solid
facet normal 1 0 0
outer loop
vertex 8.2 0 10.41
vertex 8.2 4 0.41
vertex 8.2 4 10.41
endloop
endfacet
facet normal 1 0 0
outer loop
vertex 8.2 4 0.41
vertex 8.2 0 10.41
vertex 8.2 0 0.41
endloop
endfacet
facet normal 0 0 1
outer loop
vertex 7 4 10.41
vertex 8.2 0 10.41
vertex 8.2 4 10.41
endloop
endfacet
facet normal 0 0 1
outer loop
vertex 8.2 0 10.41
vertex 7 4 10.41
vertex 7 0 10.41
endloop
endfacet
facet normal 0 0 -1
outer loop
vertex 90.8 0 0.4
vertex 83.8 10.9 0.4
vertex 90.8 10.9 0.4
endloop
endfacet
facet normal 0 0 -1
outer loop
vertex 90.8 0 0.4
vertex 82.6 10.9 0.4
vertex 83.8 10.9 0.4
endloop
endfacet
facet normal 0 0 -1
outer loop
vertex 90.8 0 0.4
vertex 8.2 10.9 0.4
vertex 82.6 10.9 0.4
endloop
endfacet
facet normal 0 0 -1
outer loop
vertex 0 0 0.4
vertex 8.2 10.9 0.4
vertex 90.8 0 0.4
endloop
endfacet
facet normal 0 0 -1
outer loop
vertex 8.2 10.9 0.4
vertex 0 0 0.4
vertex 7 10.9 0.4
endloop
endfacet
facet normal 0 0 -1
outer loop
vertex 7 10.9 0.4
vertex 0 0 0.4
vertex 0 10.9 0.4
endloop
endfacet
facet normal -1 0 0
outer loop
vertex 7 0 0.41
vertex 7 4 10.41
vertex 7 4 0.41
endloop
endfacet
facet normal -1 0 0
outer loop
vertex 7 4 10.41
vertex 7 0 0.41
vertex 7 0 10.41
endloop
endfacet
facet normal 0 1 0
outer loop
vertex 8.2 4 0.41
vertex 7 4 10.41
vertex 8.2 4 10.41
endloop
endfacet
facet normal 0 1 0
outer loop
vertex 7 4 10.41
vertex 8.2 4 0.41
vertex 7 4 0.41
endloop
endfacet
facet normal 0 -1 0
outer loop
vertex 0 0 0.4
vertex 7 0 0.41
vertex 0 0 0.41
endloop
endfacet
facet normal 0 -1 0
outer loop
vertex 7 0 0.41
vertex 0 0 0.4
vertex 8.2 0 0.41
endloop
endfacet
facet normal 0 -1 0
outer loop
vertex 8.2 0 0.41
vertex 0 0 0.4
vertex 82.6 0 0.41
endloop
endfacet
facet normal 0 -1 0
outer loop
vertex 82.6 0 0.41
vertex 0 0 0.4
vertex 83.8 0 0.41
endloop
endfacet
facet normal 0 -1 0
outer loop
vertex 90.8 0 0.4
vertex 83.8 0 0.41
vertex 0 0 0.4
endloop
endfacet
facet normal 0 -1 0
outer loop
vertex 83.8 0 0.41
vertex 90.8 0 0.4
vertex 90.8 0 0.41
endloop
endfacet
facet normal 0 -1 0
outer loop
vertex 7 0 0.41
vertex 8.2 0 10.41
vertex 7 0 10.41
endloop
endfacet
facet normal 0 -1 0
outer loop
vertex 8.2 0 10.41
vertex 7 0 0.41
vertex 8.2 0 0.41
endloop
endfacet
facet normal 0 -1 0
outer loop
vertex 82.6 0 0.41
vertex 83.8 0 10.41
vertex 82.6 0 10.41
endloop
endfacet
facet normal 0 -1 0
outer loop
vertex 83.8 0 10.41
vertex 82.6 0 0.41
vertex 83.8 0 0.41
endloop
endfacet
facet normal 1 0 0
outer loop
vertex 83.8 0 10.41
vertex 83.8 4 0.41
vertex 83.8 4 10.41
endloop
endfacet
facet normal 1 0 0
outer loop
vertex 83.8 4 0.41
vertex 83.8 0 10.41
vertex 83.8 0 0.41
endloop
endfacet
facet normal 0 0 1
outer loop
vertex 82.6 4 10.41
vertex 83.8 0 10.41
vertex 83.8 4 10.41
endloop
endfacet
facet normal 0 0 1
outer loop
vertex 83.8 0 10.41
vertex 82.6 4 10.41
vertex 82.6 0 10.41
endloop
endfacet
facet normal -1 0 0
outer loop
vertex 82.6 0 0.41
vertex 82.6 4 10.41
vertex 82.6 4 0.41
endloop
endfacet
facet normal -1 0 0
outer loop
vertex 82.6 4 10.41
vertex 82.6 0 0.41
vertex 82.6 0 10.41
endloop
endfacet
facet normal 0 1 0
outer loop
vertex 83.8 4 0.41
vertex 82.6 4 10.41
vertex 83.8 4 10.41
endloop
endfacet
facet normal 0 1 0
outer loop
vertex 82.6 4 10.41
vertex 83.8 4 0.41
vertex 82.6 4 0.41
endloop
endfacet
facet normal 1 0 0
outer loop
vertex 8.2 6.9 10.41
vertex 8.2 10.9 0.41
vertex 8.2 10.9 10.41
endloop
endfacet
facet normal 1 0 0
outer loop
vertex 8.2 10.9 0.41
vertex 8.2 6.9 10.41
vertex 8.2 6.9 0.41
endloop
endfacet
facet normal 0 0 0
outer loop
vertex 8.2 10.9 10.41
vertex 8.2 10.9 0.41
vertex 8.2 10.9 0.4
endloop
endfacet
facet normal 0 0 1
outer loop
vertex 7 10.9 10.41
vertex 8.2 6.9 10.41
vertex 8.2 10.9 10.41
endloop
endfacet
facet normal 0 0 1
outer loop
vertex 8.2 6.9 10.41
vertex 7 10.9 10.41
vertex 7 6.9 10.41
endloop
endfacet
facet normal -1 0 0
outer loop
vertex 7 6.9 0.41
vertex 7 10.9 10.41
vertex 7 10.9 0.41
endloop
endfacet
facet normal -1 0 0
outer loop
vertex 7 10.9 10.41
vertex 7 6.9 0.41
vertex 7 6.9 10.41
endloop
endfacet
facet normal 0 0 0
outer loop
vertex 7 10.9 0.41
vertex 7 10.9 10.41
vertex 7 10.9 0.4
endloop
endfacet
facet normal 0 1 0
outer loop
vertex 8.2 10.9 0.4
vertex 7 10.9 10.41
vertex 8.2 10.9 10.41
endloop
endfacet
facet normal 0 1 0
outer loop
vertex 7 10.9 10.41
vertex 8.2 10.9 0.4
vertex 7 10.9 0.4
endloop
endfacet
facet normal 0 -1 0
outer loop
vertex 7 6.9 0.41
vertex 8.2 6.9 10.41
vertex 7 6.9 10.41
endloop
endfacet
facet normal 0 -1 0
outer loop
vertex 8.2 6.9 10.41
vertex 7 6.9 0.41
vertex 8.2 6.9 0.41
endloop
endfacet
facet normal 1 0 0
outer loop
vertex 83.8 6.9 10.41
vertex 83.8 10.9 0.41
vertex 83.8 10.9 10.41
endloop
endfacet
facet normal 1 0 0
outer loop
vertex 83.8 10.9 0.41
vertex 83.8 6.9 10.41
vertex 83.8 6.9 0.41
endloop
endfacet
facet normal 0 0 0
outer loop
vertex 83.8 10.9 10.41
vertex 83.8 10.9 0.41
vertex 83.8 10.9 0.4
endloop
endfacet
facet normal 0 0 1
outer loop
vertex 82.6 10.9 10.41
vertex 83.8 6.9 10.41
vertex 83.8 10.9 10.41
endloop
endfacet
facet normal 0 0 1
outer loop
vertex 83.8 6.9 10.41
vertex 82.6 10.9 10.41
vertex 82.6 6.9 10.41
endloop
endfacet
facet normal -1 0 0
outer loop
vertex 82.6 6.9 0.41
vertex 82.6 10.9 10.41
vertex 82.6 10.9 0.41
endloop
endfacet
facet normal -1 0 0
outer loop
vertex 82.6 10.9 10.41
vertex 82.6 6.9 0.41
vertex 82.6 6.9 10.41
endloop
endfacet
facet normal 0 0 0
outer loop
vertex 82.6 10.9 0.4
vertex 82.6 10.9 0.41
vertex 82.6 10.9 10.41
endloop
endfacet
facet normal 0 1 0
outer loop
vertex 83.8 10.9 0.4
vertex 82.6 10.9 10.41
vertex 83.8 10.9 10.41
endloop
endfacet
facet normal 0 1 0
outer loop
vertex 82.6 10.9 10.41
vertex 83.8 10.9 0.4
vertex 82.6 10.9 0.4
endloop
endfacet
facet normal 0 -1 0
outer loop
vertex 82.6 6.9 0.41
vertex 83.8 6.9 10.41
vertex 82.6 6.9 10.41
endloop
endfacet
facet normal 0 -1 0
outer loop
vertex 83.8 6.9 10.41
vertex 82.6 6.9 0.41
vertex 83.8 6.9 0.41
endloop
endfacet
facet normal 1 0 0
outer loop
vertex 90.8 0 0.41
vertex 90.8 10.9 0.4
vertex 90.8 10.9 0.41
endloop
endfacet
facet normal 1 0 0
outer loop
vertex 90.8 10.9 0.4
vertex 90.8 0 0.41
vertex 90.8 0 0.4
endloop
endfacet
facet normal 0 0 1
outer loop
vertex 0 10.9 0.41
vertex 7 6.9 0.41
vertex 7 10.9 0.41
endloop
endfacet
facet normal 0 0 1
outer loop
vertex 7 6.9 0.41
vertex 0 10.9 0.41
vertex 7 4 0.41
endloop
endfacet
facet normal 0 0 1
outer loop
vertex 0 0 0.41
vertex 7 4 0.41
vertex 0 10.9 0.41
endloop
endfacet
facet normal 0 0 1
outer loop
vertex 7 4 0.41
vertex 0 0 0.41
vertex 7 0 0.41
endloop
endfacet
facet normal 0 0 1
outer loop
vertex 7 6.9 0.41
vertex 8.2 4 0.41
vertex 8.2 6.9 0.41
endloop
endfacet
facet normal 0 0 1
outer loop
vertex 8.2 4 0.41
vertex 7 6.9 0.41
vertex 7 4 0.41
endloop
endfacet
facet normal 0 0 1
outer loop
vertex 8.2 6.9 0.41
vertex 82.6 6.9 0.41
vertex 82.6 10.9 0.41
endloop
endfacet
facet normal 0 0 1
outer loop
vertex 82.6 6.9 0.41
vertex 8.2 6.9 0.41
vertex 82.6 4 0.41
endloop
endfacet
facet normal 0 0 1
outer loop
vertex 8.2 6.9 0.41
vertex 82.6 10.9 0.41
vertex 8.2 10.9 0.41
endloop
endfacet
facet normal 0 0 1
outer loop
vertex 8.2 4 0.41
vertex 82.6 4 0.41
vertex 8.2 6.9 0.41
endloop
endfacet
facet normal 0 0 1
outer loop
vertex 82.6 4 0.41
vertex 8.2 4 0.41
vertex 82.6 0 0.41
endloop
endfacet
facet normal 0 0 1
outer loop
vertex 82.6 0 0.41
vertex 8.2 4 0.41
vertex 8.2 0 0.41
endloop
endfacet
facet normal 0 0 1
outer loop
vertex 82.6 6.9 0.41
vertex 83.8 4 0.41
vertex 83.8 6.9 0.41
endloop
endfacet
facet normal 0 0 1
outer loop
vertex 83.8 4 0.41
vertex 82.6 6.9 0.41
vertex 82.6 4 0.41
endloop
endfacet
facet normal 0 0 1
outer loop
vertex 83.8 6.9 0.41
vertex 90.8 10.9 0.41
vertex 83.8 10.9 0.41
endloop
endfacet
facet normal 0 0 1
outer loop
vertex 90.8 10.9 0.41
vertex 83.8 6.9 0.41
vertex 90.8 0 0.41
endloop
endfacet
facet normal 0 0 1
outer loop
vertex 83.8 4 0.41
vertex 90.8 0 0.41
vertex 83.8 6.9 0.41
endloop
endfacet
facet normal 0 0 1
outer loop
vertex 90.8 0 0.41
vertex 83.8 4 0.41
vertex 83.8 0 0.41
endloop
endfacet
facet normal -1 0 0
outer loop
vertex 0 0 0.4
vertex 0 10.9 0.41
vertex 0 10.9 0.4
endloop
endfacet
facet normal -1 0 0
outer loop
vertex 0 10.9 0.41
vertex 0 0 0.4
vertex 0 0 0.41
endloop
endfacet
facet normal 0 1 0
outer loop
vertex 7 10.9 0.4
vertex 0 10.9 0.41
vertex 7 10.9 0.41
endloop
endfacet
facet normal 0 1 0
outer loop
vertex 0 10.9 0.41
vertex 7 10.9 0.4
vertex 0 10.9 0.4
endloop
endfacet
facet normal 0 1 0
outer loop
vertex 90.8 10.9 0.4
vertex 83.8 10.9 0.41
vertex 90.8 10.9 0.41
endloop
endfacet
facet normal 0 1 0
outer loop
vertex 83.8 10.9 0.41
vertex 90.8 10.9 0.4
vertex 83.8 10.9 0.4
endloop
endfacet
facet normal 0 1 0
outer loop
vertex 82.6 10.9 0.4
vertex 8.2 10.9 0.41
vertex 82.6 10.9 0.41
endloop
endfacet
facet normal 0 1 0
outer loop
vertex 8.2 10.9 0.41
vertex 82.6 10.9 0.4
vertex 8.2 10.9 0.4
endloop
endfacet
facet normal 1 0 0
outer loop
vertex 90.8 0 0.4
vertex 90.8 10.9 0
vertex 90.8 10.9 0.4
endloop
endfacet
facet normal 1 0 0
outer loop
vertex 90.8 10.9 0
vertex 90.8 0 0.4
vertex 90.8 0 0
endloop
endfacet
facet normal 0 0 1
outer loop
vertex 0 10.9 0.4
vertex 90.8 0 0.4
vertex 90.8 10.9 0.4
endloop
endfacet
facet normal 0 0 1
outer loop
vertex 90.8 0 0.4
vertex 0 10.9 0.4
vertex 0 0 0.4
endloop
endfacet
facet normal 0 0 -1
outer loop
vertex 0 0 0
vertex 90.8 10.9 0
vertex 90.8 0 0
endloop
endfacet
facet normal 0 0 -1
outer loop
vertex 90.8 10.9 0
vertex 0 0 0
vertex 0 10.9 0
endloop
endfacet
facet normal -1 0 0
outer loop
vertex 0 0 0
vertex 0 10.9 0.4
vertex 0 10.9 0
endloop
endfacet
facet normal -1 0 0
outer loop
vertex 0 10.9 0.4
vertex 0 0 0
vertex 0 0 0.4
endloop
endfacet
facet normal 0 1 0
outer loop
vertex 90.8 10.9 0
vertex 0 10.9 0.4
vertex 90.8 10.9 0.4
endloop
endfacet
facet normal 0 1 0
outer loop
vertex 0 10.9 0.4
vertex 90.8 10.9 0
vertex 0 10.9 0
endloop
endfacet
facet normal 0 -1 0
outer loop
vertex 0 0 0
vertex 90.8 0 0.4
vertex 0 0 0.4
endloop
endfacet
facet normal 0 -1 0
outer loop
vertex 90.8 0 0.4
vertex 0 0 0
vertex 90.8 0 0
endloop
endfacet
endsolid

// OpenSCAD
// file: ../../Base/Rotation.scad
// Fischertechnik Box Foundation
// Geometry Helpers Rotation

include <PlacementOptions.scad>

// getRotatedSpace(space, rotation=NoRotation)
// Rotates the space dependent on the specified rotation

function getRotatedSpace(space, rotation=NoRotation) = [
    (rotation == Rotate90 || rotation == Rotate270) ? space.y : space.x,
    (rotation == Rotate90 || rotation == Rotate270) ? space.x : space.y
];

// Rotates the given space around the fixed left lower corner
// space = the space the children needs as width/depth list [width,depth]
// rotation = 0 Rotate0 degrees, 1 Rotate90 degrees, 2 Rotate180 degrees, 3 Rotate270 degrees (equivalent to -90)

module RotateFix(space, rotation=NoRotation) {
    dy = (rotation == Rotate0 || rotation == Rotate270) ? 0 :
        (rotation == Rotate90) ? space.x :
        space.y;
    dx = (rotation < Rotate180) ? 0 :
        (rotation == Rotate180) ? space.x :
        space.y;
    
    translate([dx, dy, 0])
        rotate([0, 0, rotations[rotation]])
            children();
}
// file: ../../Base/Alignment.scad
// Fischertechnik Box Foundation
// Geometry Helpers Alignment

include <PlacementOptions.scad>

// getAlignedX(elementWidth, spaceWidth, align=AlignRight, offset=0)
// Gets the aligned X offset of an element with the given
// width in the given space.
// elementWidth = The width of the element to positon
// spaceWidth = The space where the element should be aligned
// align = 0 AlignLeft, 1 AlignCenter, 2 AlignRight
// offset = an optional offset from the aligned position. When
// aligned left or centered, then positive values are in X direction.
// When aligned right then positive values are in negative X direction.

function getAlignedX(elementWidth, spaceWidth, align=AlignRight, offset=0) =
    (align == AlignLeft) ?
        offset :
        ((align == AlignCenter) ?
        (spaceWidth - elementWidth)/2 + offset :
        spaceWidth - offset - elementWidth);

// getAlignedY(elementDepth, spaceDepth, align=AlignTop, offset=0)
// Gets the aligned Y offset of an element with the given
// depth in the given space.
// elementDepth = The depth of the element to positon
// spaceDepth = The space where the element should be aligned
// align = 0 AlignBottom, 1 AlignCenter, 2 AlignTop
// offset = an optional offset from the aligned position. When
// aligned bottom or centered, then positive values are in Y direction.
// When aligned top then positive values are in negative Y direction.

function getAlignedY(elementDepth, spaceDepth, align=AlignTop, offset=0) =
    (align == AlignBottom) ?
        offset :
        ((align == AlignCenter) ?
        (spaceDepth - elementDepth)/2 + offset :
        spaceDepth - offset - elementDepth);
// file: ../../Base/Boxes.scad
// Fischertechnik Box Foundation
// Pre-designed Boxes

use <Constants.scad>

include <PlacementOptions.scad>

box190Width = 190;
box190Depth = 130;
box130Width = 130;
box130Depth = 95;

// Values are from an original ec3 box
topBottomDifference = 1.5;
outerHeight = 40;
innerHeight = 38.2;
baseThickness = outerHeight - innerHeight;
stackExcess = 5.7;
radius = 3.5;
wallThickness = 1.5;
tolerance = 0.2;
stackOffset = innerHeight - stackExcess;

boxUsageHeight = stackOffset;
boxWallThickness = wallThickness;
boxBaseThickness = baseThickness;
boxWebWidth = 3.0;

// getBoxWallThickness()
// Gets the wall thickness of a Fischertechnik Box
function getBoxWallThickness() = boxWallThickness;

// getBoxUsageHeight()
// Gets the usable height of a Fischertechnik box
function getBoxUsageHeight() = boxUsageHeight;

// getBoxInnerHeight()
// Gets the inner height of a Fischertechnik box, including the stack excess
function getBoxInnerHeight() = innerHeight;

// getBoxBaseThickness()
// Gets the thickness of the Fischertechnik box base.
function getBoxBaseThickness() = boxBaseThickness;

// getBoxWebWidth()
// Gets the width of a box web
function getBoxWebWidth() = boxWebWidth;

// getBox190Space()
// Gets the usable inner space of a Box 190 as an x/y-list
function getBox190Space() = [
    box190Width - 2*getBoxWallThickness() - topBottomDifference, 
    box190Depth - 2*getBoxWallThickness() - topBottomDifference ];

// BoxBase(width, depth)
// Creates an empty stackable Fischertechnik compatible box
// width = Outer width of the box (190, 130, ...)
// depth = Outer depth of the box (130, 95, ...)

module BoxBase(width, depth, height=outerHeight) {    
    thinPlate = 0.01;

    innerHeight = height - baseThickness;    
    
    module BodyPlate(width, depth) {
        translate([radius, radius])
        hull() {
            w = width-2*radius;
            d = depth-2*radius;
            cube([w, d, thinPlate]);
            cylinder(thinPlate, r=radius, $fn=getFragments());
            translate([w, 0])
                cylinder(thinPlate, r=radius, $fn=getFragments());
            translate([w, d])
                cylinder(thinPlate, r=radius, $fn=getFragments());
            translate([0, d])
                cylinder(thinPlate, r=radius, $fn=getFragments());
        }
    }
    
    module Body(tolerance=tolerance) {
        hull() {
            // Bottom with tolerance to fit into the original boxes when stacked
            translate([-wallThickness+tolerance, -wallThickness+tolerance, -baseThickness])
                BodyPlate(width-topBottomDifference-2*tolerance, depth-topBottomDifference-2*tolerance);
            
            // Top
            translate([-wallThickness-topBottomDifference/2, -wallThickness-topBottomDifference/2, innerHeight-thinPlate])
                BodyPlate(width, depth);
         }
    }

    module Cutoff() {
        hull() {
            coWidth = width - 2*wallThickness;
            coDepth = depth - 2*wallThickness;
            
            // Bottom
            BodyPlate(coWidth-topBottomDifference, coDepth-topBottomDifference);

            // Top
            translate([-topBottomDifference/2, -topBottomDifference/2, innerHeight+thinPlate]) 
                BodyPlate(coWidth, coDepth);
        }
    }
    
    difference() {        
        Body();
        Cutoff();
        stackOffset = innerHeight - stackExcess;
        translate([0, 0, stackOffset + baseThickness])
            Body(tolerance=0);
    }
}

// Creates the Fischertechnik empty box 130x190 mm and places it at position 0,0
// 190x130 are the outer sizes, the inner space is slightly smaller. Use getBox190Space() to get the inner sizes.
// The box is positioned that the usable inner space is at the 0,0,0 position. The

module Box190() {
    BoxBase(box190Width, box190Depth);
}

// Gets the usable inner space of a Box 130 as an x/y-list
function getBox130Space() = [
    box130Width - 2*getBoxWallThickness() - topBottomDifference, 
    box130Depth - 2*getBoxWallThickness() - topBottomDifference ];

// Creates the Fischertechnik empty box 95x130 mm and places it at position 0,0
// 190x130 are the outer sizes, the inner space is slightly smaller. Use getBox190Space() to get the inner sizes.
// The box is positioned that the usable inner space is at the 0,0,0 position. The

module Box130() {
    BoxBase(box130Width, box130Depth);
}

// Creates a web at the specified box walls
// corner 0 = LowerLeft, 1 = UpperLeft, 2 = UpperRight, 3 = LowerRight
// side 0 = LeftOfCorner, 1 = RightOfCorner
// distance = Distance in mm from the corner
// boxSpace = inner width and depth of the box (default: Box 190)
// webWidth = length of the web (default is 3 mms)
// webThickness = thickness of the web (default is 1 mm)

module BoxWeb(corner, side, distance, boxSpace=getBox190Space(), webWidth=getBoxWebWidth(), webThickness=1.0) {
    sink = getBoxWallThickness()/2;

    width = (corner % 2 == 0) ? 
            (side == LeftOfCorner ? webWidth : webThickness) :
            (side == LeftOfCorner ? webThickness : webWidth);

    depth = (corner % 2 == 0) ? 
            (side == RightOfCorner ? webWidth : webThickness) :
            (side == RightOfCorner ? webThickness : webWidth);
    
    xDiff = corner == LowerLeft ? 
                (side == LeftOfCorner ? -sink : distance) :
            (corner == UpperLeft ?                
                (side == LeftOfCorner ? distance : -sink) :
            (corner == UpperRight ?
                (side == LeftOfCorner ? boxSpace.x-webWidth+sink : boxSpace.x-distance-webThickness) :
                (side == LeftOfCorner ? boxSpace.x-distance-webThickness: boxSpace.x-webWidth+sink)));

    yDiff = corner == LowerLeft ? 
                (side == RightOfCorner ? -sink : distance) :
            (corner == UpperLeft ?
                (side == RightOfCorner ? boxSpace.y-distance : boxSpace.y-webWidth+sink) :
            (corner == UpperRight ?
                (side == RightOfCorner ? boxSpace.y-webWidth+sink : boxSpace.y-distance) :
                (side == RightOfCorner ? distance : -sink)));
    
    translate([xDiff, yDiff, -getExcess()])
        cube([width, depth, boxUsageHeight + 2*getExcess()]);
}
// file: ../../Base/PlacementOptions.scad
// Fischertechnik Box Foundation
// Placement Options

// Alignment
NoAlign = 0;
AlignLeft = 1;
AlignBottom = 2;
AlignCenter = 3;
AlignRight = 4;
AlignTop = 5;

// Element rotation degree steps
rotations = [0, -90, -180, -270];

// Rotation
NoRotation = 0;
Rotate0 = 0;
Rotate90 = 1;
Rotate180 = 2;
Rotate270 = 3;

// Docking (seen from above)
NoDock = -1;
DockLeft = 0;
DockTop = 1;
DockRight = 2;
DockCorner = 2;
DockBottom = 3;

// Web corners
LowerLeft = 0;
UpperLeft = 1;
UpperRight = 2;
LowerRight = 3;

// Web position relative to corner
LeftOfCorner = 0;
RightOfCorner = 1;
// file: ../../Base/Placement.scad
// Fischertechnik Box Foundation
// Geometry Helpers Placement

use <Constants.scad>
use <Alignment.scad>
use <Rotation.scad>
use <Boxes.scad>

include <PlacementOptions.scad>

// Place(x=0, y=0, elementSpace=[0,0], alignX=AlignLeft, alignY=AlignBottom, rotation=Rotate0, boxSpace=getBox190Space())
// Places the child at the specified position
// y = Y-Position. This is a relative position when an X aligment is specified.
// x = X-Position. This is a relative position when an Y aligment is specified.
// elementSpace = space of the element to be placed [x,y]
// alignX = -1=NoAlign, 0 AlignLeft, 1 AlignCenter, 3 AlignRight (elementSpace and boxSpace required!)
// alignY = -1=NoAlign, 2 AlignBottom, 1 AlignCenter, 4 AlignTop (elementSpace and boxSpace required!)
// rotation = 0 Rotate0 0 degrees, 1 Rotate90 90 degrees, 
// 2 Rotate180 180 degrees, 3 Rotate270 270 degrees (equivalent to -90)
// boxSpace = Inner space of the box where the placement occurs [x,y] - default is Box 190x130 inner space

module Place(x=0, y=0, elementSpace=[0,0], 
  alignX=AlignLeft, alignY=AlignBottom, 
  rotation=NoRotation, boxSpace=getBox190Space()) {

    module Position(x, y, space, rotation=Rotate0) {
        translate([x, y, 0])
            RotateFix(space, rotation)
                children();
    }

    space = getRotatedSpace(elementSpace, rotation);
    alignedX = getAlignedX(space.x, boxSpace.x, alignX, x);
    alignedY = getAlignedY(space.y, boxSpace.y, alignY, y);
    Position(alignedX, alignedY, elementSpace, rotation)
        children();
}

// Center(space=getBox130Space(), elementSpace=[0,0])
// space = Space where the children is centered. For cylinder use centered=true and no elementSpace.
// elementSpace = space of the element to be centered [x,y]

module Center(space=getBox190Space(), elementSpace=[0,0]) {
    Place(elementSpace=elementSpace, boxSpace=space, alignX=AlignCenter, alignY=AlignCenter)
        children();
}

// CenterHorizontal(width=0, y=0, offset=0, space=getBox130Space())
// width = Width of the element to be placed.
// y = Y position of the element
// offset = Offset from the center position (negative will be left of the center)
// space = Space where the element is placed

module CenterHorizontal(width=0, y=0, offset=0, space=getBox190Space()) {
    Place(x=offset, y=y, elementSpace=[width, 0], boxSpace=space, alignX=AlignCenter)
        children(0);
}

// CenterVertical(depth=0, x=0, offset=0, space=getBox130Space())
// depth = Depth of the element to be placed.
// x = X position of the element
// offset = Offset from the center position (negative will be down of the center)
// space = Space where the element is placed

module CenterVertical(depth=0, x=0, offset=0, space=getBox190Space()) {
    Place(x=x, y=offset, elementSpace=[0, depth], boxSpace=space, alignY=AlignCenter)
        children(0);
}

// getIsVertical(align)
// True if the specified alignment needs a vertical orientation for a divider (AlignRight, AlignLeft)

function getIsVertical(align) = (align == AlignRight || align == AlignLeft);

// getIsHorizontal(align)
// True if the specified alignment needs a horizontal orientation for a divider (AlignTop, AlignBottom)

function getIsHorizontal(align) = (align == AlignTop || align == AlignBottom);
// file: ../../Elements/AxisClip10.scad
// Fischertechnik Box Library
// Axis for clip 10
// 31023

use <../ModelBase/Simple.scad>
use <../Base/Constants.scad>

width = 12;
depth = 12;
height = 23;
upperDiameter = 3.6;
clipHeight = 10;

// getAxisClip10Space()
// Gets the space of a frame for a clip 10 with spring ring (mot2)

function getAxisClip10Space() = [width, depth, height];

// AxisClip10(height, clipHeight)
// Axis for clip 10 with spring ring (mot2)
// height = Height of the complete axis
// clipHeight = Height of the rt for the clip (standard is 10, in mot3 its only 7)

module AxisClip10(height=height, clipHeight=clipHeight) {
    LeveledAxisWithSpace(height, height-clipHeight, getAxisClip10Space(), diameter=upperDiameter);
}

// Tests
color("lightgray")
AxisClip10();
// file: ../../Base/Constants.scad
// Fischertechnik Box Foundation
// Constants

// Constant values necessary for multiple elements

// Base constants
dividerThickness = 1.2;
excess = 0.01;
fragments = 90;
tolerance = 0.8;

// Gets the thickness of a divider 
function getDividerThickness() = dividerThickness;

// Gets the excess that is used to merge walls into each other
function getExcess() = excess;

// Gets amount of fragments of a cylinder
function getFragments() = fragments;

// Gets the inner tolerance of a frame to each side
function getTolerance() = tolerance;


// Fischertechnik specific constants
axisDiameter = 4;
axisBottomDiameter = axisDiameter + 1;
standardEdgeDistance = 2.5;
standardWebDistance = 11.5;
standardCornerLength = 15;
tubeWallFactor = 0.8;
smallPartsFrameHeight = 20;

// Gets axis diameter
function getAxisDiameter() = axisDiameter;

// Gets axis bottom diameter for thicker part at the bottom
function getAxisBottomDiameter() = axisBottomDiameter;

// gets the standard distance to the wall of the box for dockable frames with webs
function getStandardEdgeDistance() = standardEdgeDistance;

// gets the standard distance of each web to the corner of the dockable frame
function getStandardWebDistance() = standardWebDistance;

// gets the standard length of the corner walls of a dockable frame
function getStandardCornerLength() = standardCornerLength;

// gets the wall thickness of a tube.
function getTubeWallThickness() = tubeWallFactor * getDividerThickness();

// gets the frame height for docked small parts boxes.
function getSmallPartsFrameHeight() = smallPartsFrameHeight;
// file: ../../Elements/HolderBuildingPlate30x90.scad
// Fischertechnik Box Library
// Holder for Building Plate 30x90
// 31503, 38251, 38485

use <../ModelBase/Complex.scad>

width = 90;

// getHolderBuildingPlateSpace30x90(count = 1)
// Gets the width (.x) and depth (.y) space the holder needs.

function getHolderBuildingPlate30x90Space(count = 1) = getHolderBuildingPlateSpace(width, count);

// HolderBuildingPlate30x90(count=1, dock=false)
// Holder for building plates 30x90
// count = Count of building plates (default 1)
// dock = true if the holders are docked to the box wall (default false) 

module HolderBuildingPlate30x90(count = 1, dock = false) {
    HolderBuildingPlate(width, count, dock);
}

// Test
color("lightgray")
HolderBuildingPlate30x90();
// file: ../TestPrint.scad
// 3D Print Test Base

use <../Base/Constants.scad>

use <../Elements/AxisClip10.scad>

module TestPrint(elementSpace) {
    cube([elementSpace.x, elementSpace.y, 0.4]);
    translate([0,0,0.4+getExcess()]) {
        children();
    }
}

TestPrint(getAxisClip10Space())
    AxisClip10();
// main file
// 3D Print Test
// HolderBuildingPlate30x90

use <../TestPrint.scad>
use <../../Elements/HolderBuildingPlate30x90.scad>

TestPrint(getHolderBuildingPlate30x90Space())
    HolderBuildingPlate30x90();
